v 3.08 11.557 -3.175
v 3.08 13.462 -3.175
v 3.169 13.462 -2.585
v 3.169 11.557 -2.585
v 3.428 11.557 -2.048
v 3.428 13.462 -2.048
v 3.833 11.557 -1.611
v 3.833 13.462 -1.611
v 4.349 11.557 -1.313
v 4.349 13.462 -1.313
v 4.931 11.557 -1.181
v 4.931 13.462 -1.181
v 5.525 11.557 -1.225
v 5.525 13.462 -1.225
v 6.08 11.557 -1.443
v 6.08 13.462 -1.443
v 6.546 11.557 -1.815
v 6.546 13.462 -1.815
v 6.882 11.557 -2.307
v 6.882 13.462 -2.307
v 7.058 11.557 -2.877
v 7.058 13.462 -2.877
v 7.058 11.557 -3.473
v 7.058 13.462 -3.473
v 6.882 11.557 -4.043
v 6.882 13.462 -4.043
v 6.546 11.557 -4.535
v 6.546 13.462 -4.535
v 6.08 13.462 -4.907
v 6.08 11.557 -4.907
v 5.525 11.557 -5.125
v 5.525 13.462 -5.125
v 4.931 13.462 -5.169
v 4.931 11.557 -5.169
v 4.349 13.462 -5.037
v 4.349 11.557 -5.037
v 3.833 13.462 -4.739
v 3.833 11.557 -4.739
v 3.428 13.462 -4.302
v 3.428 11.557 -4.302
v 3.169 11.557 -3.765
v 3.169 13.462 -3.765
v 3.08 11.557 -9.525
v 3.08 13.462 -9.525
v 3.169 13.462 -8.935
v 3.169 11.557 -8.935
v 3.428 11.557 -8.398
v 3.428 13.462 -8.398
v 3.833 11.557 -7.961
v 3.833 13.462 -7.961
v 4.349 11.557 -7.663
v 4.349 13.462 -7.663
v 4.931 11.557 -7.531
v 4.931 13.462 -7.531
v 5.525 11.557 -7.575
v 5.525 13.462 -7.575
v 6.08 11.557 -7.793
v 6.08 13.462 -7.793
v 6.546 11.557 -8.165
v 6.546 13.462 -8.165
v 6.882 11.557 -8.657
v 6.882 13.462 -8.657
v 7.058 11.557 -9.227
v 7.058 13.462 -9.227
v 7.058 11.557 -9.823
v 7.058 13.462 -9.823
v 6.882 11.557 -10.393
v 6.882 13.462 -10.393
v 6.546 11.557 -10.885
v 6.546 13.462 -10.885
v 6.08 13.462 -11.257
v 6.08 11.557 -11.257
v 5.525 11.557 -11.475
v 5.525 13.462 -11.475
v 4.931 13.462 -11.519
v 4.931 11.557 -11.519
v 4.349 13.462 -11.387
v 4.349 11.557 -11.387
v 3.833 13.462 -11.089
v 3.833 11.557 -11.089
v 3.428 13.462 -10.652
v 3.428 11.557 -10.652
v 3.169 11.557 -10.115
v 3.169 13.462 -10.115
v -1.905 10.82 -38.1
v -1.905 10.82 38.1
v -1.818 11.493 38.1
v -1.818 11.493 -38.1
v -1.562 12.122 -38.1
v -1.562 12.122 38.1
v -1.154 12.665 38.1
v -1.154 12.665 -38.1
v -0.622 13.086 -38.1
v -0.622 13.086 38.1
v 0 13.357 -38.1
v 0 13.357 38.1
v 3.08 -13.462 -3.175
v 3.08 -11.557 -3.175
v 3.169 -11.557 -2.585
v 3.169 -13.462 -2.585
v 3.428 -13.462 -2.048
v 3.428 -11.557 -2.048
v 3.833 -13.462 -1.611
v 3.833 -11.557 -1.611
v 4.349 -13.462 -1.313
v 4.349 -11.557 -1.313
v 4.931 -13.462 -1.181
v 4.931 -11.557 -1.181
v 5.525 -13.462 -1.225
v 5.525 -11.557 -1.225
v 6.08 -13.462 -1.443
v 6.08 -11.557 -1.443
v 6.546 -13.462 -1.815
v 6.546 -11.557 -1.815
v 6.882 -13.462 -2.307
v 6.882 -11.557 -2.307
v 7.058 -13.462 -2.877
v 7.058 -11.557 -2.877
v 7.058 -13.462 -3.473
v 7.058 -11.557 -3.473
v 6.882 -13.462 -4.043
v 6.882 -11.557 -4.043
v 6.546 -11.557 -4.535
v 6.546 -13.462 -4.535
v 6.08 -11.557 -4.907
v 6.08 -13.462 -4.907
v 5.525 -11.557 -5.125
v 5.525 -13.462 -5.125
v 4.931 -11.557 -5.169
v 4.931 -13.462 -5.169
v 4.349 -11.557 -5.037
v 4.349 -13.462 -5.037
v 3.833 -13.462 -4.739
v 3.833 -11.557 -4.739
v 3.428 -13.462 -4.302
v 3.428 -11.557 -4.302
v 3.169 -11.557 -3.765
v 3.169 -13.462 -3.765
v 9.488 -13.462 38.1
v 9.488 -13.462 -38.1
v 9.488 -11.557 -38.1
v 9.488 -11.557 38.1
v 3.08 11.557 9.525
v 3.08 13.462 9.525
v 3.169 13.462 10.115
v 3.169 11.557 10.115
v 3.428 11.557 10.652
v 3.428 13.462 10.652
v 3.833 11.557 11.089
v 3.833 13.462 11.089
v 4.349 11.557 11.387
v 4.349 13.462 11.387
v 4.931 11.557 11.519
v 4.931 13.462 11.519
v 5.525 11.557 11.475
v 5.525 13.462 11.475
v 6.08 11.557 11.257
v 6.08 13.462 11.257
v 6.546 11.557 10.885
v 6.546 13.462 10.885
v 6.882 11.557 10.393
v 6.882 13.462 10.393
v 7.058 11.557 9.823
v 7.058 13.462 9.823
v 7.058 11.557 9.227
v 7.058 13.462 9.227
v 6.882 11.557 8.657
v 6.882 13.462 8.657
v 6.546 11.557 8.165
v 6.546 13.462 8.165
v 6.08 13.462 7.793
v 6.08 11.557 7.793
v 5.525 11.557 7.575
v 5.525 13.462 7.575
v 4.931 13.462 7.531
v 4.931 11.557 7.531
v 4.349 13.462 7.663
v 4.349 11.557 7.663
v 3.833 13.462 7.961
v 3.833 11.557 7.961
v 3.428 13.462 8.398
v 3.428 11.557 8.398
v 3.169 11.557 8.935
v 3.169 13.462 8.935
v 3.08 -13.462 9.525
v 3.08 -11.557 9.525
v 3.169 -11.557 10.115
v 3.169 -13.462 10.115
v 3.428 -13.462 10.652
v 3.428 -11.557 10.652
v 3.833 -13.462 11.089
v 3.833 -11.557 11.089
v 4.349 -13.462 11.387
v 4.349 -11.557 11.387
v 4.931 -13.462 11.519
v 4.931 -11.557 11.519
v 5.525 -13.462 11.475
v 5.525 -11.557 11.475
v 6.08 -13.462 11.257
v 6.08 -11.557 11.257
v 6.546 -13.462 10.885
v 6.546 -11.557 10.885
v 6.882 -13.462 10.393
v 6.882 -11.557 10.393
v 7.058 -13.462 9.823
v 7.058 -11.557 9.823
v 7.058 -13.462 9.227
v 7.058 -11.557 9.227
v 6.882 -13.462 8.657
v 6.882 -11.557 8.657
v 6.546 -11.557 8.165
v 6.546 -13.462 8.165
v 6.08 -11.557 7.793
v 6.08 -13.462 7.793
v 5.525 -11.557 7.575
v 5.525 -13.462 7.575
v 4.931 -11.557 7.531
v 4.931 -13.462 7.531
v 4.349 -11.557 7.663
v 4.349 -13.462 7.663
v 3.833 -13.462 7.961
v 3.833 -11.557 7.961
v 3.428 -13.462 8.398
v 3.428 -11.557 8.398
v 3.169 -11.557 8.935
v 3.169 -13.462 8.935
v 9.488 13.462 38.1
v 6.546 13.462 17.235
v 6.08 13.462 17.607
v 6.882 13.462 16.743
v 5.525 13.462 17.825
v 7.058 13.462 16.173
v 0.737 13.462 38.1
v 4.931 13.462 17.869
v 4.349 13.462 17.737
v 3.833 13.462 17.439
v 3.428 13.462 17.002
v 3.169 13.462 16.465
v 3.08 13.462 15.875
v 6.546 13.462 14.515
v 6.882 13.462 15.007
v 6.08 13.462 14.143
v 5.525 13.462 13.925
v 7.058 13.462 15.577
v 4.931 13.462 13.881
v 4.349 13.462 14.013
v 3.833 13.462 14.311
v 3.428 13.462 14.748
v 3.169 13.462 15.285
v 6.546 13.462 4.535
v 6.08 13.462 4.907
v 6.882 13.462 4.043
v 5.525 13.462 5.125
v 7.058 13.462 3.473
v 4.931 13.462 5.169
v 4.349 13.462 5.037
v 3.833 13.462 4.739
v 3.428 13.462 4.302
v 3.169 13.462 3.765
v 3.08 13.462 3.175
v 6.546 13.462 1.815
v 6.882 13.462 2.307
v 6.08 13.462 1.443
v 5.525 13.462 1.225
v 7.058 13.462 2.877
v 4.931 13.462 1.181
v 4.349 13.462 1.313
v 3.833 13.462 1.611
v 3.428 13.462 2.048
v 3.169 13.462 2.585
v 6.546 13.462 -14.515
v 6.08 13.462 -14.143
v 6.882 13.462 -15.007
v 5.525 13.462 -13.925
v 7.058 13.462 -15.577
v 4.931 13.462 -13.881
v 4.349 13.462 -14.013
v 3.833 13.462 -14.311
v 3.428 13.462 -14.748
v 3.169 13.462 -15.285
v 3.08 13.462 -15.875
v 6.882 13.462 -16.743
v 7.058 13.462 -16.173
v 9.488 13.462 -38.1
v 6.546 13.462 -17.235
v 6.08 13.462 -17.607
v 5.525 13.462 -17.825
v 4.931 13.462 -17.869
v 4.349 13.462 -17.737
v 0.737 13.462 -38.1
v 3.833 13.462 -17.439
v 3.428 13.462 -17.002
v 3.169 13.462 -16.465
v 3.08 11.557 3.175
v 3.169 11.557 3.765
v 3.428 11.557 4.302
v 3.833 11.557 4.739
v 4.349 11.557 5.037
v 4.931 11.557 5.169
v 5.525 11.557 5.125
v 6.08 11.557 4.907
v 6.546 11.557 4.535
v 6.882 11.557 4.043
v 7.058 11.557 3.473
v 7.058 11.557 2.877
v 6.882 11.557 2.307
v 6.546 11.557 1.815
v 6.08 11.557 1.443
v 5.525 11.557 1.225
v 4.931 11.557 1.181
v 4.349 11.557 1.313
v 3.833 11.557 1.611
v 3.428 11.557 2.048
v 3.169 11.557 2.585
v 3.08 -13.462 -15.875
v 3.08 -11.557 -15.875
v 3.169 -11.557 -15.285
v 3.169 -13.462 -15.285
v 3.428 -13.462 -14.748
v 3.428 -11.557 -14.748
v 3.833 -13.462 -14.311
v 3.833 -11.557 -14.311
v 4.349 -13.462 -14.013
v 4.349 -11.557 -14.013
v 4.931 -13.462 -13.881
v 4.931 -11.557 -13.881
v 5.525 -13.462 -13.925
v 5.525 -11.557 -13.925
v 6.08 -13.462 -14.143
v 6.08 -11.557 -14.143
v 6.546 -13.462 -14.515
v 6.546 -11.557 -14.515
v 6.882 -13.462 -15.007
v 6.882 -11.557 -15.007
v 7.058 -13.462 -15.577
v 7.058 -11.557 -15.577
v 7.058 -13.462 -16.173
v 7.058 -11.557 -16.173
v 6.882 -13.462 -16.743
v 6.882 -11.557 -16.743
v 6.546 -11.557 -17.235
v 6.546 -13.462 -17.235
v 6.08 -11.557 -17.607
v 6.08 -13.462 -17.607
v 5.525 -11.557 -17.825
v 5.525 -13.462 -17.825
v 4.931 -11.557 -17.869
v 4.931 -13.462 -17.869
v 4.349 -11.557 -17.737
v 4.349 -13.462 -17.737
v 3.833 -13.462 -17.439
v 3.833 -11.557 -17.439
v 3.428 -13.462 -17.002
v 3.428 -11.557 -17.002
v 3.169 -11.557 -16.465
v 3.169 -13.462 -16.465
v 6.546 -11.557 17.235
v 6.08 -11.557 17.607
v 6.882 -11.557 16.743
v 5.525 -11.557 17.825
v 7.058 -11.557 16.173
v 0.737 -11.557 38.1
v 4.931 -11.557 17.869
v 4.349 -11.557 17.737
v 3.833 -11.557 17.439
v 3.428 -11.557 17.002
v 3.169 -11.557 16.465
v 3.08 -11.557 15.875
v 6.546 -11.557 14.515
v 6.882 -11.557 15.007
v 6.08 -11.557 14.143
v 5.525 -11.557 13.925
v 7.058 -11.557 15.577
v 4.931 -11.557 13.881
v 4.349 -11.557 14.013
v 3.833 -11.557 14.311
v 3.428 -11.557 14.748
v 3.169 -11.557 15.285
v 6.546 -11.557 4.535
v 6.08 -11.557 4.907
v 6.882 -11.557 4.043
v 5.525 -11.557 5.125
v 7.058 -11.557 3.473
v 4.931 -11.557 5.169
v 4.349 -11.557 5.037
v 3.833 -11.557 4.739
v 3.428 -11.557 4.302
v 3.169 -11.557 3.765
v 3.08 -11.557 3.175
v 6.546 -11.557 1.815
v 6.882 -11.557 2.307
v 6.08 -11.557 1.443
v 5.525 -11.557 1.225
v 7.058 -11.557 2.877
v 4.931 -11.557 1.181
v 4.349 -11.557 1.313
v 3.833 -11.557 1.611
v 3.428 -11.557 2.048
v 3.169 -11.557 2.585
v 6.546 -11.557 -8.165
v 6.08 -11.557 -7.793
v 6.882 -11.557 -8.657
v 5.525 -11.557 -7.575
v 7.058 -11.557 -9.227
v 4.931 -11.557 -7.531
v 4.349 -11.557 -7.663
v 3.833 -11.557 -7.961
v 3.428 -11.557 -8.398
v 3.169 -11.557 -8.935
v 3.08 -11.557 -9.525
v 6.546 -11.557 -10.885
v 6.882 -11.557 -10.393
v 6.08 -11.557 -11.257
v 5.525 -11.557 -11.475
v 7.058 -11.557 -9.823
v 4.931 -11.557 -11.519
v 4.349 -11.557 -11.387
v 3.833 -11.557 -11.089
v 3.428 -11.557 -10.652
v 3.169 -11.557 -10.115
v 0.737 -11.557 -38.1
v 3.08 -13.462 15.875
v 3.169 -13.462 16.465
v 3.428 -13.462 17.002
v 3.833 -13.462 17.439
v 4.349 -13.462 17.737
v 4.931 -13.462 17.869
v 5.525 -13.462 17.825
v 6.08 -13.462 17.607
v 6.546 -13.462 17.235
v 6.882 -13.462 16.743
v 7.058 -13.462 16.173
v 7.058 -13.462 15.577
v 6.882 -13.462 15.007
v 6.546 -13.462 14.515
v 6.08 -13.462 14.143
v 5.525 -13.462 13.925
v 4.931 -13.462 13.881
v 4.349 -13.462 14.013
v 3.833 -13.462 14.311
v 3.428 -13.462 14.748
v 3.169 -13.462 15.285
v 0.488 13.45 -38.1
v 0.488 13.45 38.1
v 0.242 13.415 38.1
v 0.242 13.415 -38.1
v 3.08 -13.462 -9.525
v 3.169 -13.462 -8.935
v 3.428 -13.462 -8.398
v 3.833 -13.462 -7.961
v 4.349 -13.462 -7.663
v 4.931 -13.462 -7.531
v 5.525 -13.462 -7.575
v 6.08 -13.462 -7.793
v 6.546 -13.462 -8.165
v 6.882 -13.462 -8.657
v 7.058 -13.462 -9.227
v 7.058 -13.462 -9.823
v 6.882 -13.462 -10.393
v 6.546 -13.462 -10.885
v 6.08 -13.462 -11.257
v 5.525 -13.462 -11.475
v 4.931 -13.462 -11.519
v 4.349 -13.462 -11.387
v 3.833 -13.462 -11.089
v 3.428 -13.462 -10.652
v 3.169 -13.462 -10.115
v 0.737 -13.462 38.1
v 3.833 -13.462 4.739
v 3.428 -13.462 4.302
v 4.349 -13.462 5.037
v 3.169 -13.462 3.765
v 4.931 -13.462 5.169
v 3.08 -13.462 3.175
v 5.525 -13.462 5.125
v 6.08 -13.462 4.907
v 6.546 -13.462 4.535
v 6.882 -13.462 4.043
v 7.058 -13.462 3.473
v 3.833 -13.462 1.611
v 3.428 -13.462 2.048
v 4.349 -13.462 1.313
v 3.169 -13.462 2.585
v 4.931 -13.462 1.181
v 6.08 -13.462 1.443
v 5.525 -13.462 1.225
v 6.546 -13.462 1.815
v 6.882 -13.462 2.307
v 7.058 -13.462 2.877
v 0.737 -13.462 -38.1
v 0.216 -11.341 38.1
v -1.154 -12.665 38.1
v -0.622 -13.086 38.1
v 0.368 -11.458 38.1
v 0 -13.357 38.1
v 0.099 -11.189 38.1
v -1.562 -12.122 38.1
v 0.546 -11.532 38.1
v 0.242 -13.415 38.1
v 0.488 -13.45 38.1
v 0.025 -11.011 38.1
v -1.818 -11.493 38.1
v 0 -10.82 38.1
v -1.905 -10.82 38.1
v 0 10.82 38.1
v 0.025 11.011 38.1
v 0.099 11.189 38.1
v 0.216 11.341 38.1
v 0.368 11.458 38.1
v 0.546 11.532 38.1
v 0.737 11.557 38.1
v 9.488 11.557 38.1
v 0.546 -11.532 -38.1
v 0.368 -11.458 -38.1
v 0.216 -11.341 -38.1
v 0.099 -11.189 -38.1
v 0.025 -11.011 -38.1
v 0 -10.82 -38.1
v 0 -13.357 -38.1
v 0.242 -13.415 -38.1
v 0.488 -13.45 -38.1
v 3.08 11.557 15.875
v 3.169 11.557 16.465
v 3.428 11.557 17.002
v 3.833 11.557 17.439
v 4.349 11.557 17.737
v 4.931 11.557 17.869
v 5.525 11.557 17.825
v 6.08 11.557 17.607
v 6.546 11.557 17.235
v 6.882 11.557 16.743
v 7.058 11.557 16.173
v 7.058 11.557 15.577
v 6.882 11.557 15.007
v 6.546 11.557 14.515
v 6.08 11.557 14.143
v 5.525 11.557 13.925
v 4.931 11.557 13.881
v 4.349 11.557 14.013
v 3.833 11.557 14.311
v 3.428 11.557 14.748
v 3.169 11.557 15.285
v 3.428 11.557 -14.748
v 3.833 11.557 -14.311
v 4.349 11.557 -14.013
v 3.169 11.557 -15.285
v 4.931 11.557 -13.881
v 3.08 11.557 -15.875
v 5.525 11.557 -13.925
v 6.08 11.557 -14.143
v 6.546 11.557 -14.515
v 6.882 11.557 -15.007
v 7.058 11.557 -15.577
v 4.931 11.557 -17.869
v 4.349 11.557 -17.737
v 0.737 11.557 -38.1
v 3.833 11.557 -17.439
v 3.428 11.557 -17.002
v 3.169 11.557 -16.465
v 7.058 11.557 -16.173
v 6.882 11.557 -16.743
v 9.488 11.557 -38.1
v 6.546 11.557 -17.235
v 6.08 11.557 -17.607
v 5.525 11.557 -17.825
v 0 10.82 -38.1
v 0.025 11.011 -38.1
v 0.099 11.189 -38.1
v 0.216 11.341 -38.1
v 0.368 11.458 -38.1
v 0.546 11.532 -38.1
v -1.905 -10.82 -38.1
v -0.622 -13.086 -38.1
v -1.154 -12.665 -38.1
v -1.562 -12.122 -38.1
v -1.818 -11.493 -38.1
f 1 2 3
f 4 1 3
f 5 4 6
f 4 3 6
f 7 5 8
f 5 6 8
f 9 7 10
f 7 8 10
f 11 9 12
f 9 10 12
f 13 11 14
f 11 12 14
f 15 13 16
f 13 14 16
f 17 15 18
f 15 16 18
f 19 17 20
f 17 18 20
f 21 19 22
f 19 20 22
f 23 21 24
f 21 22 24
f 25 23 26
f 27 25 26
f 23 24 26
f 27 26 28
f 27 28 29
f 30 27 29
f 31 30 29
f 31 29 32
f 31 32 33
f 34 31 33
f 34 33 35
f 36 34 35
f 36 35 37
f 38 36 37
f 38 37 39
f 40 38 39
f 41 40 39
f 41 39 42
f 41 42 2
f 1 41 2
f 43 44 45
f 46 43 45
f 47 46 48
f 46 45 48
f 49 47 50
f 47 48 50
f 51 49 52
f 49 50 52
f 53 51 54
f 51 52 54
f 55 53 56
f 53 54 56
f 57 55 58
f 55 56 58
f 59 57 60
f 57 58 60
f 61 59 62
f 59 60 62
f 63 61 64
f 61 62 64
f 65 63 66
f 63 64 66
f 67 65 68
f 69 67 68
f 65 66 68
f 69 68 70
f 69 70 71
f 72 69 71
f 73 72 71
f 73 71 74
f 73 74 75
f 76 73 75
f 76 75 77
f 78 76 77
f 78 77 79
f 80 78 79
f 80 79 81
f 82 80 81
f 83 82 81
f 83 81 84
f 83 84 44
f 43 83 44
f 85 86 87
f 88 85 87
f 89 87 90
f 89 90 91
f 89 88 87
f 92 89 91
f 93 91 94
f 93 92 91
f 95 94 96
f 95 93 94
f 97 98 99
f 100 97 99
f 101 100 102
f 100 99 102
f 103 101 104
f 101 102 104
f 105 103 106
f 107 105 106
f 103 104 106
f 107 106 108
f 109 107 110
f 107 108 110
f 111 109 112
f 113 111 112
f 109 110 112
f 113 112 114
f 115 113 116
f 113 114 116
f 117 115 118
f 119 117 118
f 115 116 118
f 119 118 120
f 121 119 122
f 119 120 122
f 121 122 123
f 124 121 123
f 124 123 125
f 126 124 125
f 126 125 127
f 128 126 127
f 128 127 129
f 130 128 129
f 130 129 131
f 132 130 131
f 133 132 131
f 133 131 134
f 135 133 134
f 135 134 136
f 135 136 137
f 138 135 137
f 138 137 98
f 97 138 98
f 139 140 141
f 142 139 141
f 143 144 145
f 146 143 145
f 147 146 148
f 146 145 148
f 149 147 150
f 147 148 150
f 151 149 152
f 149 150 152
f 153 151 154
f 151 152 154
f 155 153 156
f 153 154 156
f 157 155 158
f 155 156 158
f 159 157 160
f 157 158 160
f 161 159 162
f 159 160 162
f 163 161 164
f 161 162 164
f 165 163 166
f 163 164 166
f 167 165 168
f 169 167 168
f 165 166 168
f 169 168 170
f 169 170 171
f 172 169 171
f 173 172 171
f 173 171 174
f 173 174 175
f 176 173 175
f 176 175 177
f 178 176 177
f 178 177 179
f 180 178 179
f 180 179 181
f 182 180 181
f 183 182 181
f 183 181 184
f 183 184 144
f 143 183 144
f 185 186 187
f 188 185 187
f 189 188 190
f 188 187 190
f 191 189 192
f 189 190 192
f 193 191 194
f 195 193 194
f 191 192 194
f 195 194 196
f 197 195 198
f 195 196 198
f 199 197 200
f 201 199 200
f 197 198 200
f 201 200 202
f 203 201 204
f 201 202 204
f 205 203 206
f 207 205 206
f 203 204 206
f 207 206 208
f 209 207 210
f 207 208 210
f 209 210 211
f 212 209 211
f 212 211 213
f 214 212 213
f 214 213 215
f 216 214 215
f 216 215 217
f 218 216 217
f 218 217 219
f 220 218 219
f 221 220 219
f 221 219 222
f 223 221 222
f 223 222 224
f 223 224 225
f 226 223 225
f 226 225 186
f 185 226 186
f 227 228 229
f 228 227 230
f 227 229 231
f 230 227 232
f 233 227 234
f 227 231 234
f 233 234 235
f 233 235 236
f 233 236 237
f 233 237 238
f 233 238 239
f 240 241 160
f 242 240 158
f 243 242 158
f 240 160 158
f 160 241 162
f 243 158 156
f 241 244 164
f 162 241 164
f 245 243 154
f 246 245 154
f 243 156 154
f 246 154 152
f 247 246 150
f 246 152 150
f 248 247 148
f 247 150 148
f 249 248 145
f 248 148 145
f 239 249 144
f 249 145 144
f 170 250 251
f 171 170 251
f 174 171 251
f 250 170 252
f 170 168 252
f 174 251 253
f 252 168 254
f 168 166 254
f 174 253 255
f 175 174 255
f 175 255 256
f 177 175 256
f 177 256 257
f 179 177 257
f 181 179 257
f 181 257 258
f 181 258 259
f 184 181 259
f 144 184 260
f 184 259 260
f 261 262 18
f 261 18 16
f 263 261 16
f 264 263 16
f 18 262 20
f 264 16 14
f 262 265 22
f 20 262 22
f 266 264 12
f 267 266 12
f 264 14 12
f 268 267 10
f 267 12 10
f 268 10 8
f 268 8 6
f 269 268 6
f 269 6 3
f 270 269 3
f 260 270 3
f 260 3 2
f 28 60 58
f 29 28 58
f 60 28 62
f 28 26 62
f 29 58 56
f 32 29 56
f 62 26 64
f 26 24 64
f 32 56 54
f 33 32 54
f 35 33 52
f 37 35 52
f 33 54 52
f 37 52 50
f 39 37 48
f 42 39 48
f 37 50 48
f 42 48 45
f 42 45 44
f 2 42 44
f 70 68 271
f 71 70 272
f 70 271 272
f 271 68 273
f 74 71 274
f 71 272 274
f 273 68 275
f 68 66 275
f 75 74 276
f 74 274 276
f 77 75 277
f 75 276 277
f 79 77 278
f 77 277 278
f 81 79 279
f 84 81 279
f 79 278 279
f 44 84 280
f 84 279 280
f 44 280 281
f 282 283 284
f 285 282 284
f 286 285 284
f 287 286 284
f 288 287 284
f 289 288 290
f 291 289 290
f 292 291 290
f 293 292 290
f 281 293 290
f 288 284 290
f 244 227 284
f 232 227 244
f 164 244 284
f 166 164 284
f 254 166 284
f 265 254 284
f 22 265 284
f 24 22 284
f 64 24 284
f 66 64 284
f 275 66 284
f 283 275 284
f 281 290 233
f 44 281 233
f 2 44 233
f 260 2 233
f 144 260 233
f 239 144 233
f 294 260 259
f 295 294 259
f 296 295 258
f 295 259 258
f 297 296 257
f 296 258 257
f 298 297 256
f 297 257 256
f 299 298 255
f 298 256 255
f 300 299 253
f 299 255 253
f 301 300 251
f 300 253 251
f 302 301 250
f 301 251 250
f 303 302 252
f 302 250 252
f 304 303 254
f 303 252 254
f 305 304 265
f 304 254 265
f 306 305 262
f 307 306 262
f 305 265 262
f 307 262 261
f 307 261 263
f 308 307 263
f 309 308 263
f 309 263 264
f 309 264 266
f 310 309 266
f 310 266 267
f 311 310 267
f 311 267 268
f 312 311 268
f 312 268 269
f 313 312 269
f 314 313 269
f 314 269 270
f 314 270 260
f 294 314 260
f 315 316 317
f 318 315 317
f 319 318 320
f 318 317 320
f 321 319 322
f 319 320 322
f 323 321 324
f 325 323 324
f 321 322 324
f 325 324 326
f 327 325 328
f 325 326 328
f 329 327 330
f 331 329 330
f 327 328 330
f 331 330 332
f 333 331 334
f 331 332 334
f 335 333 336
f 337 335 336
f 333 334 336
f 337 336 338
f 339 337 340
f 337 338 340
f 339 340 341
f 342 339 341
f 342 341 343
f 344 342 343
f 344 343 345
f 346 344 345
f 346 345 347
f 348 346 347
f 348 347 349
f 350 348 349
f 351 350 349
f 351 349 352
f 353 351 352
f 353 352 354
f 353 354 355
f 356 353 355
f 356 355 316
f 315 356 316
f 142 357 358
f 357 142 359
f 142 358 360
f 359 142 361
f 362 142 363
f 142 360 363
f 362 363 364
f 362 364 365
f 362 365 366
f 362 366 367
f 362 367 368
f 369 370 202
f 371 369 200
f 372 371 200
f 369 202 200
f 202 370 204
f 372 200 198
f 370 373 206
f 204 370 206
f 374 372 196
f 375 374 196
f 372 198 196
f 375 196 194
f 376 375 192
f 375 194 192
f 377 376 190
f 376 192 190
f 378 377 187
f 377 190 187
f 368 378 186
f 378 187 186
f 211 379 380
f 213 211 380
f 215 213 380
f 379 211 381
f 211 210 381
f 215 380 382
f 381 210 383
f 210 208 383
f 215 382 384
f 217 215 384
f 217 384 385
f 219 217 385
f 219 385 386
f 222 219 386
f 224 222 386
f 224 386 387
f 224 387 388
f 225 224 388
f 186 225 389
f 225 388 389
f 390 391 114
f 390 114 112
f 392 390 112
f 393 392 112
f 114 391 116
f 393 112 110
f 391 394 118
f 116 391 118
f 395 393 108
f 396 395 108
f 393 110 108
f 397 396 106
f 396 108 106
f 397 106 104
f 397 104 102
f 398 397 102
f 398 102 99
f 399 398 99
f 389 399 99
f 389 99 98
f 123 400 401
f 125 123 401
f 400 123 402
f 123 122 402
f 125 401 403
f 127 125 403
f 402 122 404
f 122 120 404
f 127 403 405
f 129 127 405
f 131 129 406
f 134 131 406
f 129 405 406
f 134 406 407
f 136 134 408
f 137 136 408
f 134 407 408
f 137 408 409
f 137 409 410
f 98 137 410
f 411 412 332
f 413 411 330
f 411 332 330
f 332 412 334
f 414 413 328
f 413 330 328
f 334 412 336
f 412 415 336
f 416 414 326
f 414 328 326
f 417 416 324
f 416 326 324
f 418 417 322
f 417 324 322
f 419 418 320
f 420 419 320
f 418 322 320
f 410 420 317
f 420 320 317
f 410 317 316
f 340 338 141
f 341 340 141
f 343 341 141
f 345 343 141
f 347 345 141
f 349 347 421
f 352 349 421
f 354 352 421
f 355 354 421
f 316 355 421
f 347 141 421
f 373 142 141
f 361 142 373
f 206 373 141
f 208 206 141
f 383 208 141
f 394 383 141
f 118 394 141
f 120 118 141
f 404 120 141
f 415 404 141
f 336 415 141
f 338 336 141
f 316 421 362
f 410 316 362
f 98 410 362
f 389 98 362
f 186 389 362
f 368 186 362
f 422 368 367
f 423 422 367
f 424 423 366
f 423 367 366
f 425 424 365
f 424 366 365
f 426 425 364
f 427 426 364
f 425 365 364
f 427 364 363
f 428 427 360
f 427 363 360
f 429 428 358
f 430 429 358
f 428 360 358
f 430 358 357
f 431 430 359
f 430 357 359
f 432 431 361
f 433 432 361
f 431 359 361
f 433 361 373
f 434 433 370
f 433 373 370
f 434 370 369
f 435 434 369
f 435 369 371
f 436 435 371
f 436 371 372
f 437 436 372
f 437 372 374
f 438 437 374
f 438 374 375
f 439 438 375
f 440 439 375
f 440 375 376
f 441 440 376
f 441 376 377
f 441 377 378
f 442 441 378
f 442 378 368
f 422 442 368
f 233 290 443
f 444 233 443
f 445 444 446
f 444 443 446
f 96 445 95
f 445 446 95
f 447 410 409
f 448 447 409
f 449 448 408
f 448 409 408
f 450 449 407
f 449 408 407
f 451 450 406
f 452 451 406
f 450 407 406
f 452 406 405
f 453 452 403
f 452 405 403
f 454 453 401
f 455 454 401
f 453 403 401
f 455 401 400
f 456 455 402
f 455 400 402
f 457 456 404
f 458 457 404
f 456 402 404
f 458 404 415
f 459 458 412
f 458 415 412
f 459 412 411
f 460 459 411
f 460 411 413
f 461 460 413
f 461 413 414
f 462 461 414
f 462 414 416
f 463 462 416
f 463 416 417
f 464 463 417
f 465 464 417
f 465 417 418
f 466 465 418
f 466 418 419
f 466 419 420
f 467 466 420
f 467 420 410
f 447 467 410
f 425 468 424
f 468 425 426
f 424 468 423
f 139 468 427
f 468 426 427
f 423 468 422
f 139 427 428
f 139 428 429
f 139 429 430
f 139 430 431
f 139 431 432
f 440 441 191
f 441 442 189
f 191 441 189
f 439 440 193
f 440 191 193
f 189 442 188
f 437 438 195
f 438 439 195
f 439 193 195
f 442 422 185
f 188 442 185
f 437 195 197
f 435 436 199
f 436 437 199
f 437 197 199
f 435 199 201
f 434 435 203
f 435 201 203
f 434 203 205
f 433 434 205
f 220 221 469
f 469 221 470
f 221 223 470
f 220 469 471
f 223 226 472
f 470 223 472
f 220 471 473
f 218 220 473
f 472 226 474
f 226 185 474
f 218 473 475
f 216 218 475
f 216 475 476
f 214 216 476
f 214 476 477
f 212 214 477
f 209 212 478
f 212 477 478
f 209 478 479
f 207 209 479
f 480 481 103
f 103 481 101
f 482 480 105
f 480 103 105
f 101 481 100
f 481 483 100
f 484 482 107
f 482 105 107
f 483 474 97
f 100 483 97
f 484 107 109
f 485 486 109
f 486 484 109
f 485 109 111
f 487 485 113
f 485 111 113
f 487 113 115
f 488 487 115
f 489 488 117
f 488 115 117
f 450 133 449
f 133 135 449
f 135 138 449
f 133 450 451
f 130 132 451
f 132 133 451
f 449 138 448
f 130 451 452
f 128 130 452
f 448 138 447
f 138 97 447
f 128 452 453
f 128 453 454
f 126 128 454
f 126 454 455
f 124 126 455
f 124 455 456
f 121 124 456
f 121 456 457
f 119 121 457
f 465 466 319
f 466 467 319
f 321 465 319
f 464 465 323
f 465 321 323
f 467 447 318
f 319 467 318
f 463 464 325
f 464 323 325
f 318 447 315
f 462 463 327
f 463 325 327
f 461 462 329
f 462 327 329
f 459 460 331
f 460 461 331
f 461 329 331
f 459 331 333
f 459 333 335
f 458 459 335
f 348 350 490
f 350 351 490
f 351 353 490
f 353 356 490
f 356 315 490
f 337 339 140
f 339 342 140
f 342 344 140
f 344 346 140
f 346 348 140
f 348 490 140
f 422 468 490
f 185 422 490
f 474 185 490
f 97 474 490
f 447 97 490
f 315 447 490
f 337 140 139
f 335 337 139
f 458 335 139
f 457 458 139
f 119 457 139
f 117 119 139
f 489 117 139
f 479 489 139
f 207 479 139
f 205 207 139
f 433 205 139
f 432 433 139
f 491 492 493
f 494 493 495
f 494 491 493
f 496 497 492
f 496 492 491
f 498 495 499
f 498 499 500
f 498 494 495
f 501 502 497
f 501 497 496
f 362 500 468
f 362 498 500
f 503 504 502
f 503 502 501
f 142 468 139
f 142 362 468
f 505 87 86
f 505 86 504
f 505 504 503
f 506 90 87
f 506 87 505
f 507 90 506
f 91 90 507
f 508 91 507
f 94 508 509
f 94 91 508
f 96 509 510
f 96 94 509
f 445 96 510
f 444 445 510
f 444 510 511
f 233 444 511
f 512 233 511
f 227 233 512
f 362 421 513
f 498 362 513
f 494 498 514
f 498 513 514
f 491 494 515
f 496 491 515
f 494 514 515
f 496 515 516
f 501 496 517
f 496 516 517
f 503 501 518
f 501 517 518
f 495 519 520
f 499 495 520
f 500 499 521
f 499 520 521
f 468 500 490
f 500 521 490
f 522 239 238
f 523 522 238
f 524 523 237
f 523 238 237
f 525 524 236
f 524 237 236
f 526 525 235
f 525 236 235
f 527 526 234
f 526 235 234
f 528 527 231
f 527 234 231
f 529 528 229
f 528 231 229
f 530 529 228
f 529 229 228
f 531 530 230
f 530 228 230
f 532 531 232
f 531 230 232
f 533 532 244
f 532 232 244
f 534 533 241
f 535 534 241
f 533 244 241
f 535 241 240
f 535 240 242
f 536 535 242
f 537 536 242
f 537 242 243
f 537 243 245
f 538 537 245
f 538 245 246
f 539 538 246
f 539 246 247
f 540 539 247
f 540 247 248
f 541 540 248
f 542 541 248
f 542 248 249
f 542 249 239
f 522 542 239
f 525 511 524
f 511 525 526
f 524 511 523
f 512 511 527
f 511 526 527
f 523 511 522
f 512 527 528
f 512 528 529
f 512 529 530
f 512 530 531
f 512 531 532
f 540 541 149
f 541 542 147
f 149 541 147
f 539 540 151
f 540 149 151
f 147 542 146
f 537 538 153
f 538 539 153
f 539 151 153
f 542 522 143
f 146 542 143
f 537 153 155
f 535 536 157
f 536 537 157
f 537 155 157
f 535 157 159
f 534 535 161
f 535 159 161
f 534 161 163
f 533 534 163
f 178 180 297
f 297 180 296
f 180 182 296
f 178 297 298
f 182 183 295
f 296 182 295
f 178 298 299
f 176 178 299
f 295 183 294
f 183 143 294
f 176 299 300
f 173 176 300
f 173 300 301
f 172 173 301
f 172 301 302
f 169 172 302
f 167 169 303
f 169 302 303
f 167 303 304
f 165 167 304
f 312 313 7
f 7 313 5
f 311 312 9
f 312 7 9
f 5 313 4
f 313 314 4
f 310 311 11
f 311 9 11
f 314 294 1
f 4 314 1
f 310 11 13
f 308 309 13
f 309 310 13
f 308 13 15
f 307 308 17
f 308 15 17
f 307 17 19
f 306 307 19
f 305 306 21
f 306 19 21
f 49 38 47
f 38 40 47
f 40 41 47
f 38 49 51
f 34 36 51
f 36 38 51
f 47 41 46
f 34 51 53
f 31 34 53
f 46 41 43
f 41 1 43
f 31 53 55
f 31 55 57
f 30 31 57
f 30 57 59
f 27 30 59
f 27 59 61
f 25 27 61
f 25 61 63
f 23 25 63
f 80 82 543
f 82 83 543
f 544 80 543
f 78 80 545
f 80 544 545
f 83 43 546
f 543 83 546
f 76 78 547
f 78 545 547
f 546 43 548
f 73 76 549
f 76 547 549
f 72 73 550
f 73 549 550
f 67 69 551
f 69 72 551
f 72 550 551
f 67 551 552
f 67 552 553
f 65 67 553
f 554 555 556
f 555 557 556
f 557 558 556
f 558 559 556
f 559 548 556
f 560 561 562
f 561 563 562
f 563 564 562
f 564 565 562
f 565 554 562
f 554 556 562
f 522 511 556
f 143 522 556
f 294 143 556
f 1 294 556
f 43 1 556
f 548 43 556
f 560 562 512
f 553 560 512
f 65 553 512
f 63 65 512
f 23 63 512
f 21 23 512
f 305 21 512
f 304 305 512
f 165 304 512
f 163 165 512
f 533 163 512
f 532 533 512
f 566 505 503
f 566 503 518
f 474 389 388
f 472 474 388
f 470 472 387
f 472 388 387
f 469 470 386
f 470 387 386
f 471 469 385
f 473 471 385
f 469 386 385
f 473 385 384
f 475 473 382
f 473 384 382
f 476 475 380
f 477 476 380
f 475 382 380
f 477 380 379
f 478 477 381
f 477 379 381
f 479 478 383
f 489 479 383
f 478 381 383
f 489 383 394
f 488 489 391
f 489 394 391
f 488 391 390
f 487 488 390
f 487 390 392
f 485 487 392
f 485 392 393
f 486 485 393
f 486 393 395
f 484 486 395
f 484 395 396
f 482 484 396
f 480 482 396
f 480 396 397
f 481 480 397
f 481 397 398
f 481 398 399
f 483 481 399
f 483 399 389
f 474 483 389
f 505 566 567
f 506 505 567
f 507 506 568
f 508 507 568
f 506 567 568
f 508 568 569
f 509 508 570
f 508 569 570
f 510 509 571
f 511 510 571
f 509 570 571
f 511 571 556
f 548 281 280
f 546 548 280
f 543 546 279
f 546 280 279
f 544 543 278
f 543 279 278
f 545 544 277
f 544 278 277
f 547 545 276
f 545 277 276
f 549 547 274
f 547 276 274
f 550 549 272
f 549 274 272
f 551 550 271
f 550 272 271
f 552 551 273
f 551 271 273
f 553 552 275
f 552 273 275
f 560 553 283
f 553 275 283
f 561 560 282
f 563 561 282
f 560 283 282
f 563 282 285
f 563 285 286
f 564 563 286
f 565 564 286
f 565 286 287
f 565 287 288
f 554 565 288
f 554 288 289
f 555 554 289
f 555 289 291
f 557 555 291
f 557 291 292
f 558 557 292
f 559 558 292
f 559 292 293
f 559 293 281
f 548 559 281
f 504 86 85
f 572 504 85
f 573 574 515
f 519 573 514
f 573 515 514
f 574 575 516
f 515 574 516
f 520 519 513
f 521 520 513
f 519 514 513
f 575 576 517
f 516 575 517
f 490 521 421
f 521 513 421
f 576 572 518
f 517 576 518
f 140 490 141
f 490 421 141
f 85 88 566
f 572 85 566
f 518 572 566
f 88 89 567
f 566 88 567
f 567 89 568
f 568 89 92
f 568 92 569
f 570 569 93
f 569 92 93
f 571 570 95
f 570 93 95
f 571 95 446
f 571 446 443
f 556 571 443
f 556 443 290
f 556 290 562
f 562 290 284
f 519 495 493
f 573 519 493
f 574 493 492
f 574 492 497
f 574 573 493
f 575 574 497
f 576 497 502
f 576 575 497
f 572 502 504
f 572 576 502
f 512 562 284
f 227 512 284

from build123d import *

# Parameters (mm, degrees)
SKETCH4_W              = 76.2
SKETCH4_H              = 44.45
BASE_FLANGE1_DEPTH     = 1.905
SKETCHED_START         = -38.1
SKETCHED_BEND3_DEPTH   = 76.2
SKETCHED_BEND3_2_DEPTH = 76.2
CUT_EXTRUDE2_REACH     = 49.608
SKETCH20_R             = 2


# Read off the part's stored shape, not the designer's step: Sketched Bend3
# Sheet-metal steps are written as plain solids
with BuildPart() as part:
    # Sketch4 → Base-Flange1 (new body)
    with BuildSketch(Plane(origin=(0, 0, 0), x_dir=(0, 0, -1), z_dir=(1, 0, 0))):
        Rectangle(SKETCH4_W, SKETCH4_H)
    extrude(amount=-BASE_FLANGE1_DEPTH)

    # Sketched Bend3 outline → Sketched Bend3 (cut)
    with BuildSketch(Plane.XY.offset(SKETCHED_START)):
        with BuildLine():
            ThreePointArc((0, -13.357223013), (-1.375727285, -12.406629491), (-1.905, -10.8204))
            Line((-1.905, -10.8204), (-1.905, -22.225))
            Line((-1.905, -22.225), (0, -22.225))
            Line((0, -22.225), (0, -13.357223013))
        make_face()
        with BuildLine():
            Line((-1.905, 22.225), (-1.905, 10.8204))
            ThreePointArc((-1.905, 10.8204), (-1.375727285, 12.406629491), (0, 13.357223013))
            Line((0, 13.357223013), (0, 22.225))
            Line((0, 22.225), (-1.905, 22.225))
        make_face()
    extrude(amount=SKETCHED_BEND3_DEPTH, mode=Mode.SUBTRACT)

    # Sketched Bend3 2 outline → Sketched Bend3 2 (add)
    with BuildSketch(Plane.XY.offset(SKETCHED_START)):
        with BuildLine():
            Line((0, -10.8204), (0, -13.357223013))
            ThreePointArc((0, -13.357223013), (0.364592683, -13.435674577), (0.7366, -13.462))
            Line((0.7366, -13.462), (9.487967924, -13.462))
            Line((9.487967924, -13.462), (9.487967924, -11.557))
            Line((9.487967924, -11.557), (0.7366, -11.557))
            ThreePointArc((0.7366, -11.557), (0.215745145, -11.341254855), (0, -10.8204))
        make_face()
        with BuildLine():
            ThreePointArc((0.7366, 13.462), (0.364592683, 13.435674577), (0, 13.357223013))
            Line((0, 13.357223013), (0, 10.8204))
            ThreePointArc((0, 10.8204), (0.215745145, 11.341254855), (0.7366, 11.557))
            Line((0.7366, 11.557), (9.487967924, 11.557))
            Line((9.487967924, 11.557), (9.487967924, 13.462))
            Line((9.487967924, 13.462), (0.7366, 13.462))
        make_face()
    extrude(amount=SKETCHED_BEND3_2_DEPTH)

    # Cut-Extrude2: up to this face of the body (flat: up to its plane)
    cut_extrude2_end = Plane(part.part.faces().sort_by_distance((5.112283962, -13.462, 0))[0])
    # Sketch20 → Cut-Extrude2 (cut, up to the picked face)
    with BuildSketch(Plane(origin=(0, 13.462, 0), x_dir=(1, 0, 0), z_dir=(0, 1, 0)), mode=Mode.PRIVATE) as cut_extrude2_sk1:
        with Locations(Location((5.08, -3.175, 0), (0, 0, 180))):
            Circle(SKETCH20_R)
    cut_extrude2_tool1 = split(extrude(cut_extrude2_sk1.sketch, amount=-CUT_EXTRUDE2_REACH, mode=Mode.PRIVATE), bisect_by=cut_extrude2_end, keep=Keep.BOTH, mode=Mode.PRIVATE)
    # Sketch20 → Cut-Extrude2 (cut, up to the picked face)
    with BuildSketch(Plane(origin=(0, 13.462, 0), x_dir=(1, 0, 0), z_dir=(0, 1, 0)), mode=Mode.PRIVATE) as cut_extrude2_sk2:
        with Locations(Location((5.08, 3.175, 0), (0, 0, 180))):
            Circle(SKETCH20_R)
    cut_extrude2_tool2 = split(extrude(cut_extrude2_sk2.sketch, amount=-CUT_EXTRUDE2_REACH, mode=Mode.PRIVATE), bisect_by=cut_extrude2_end, keep=Keep.BOTH, mode=Mode.PRIVATE)
    # Sketch20 → Cut-Extrude2 (cut, up to the picked face)
    with BuildSketch(Plane(origin=(0, 13.462, 0), x_dir=(1, 0, 0), z_dir=(0, 1, 0)), mode=Mode.PRIVATE) as cut_extrude2_sk3:
        with Locations(Location((5.08, 9.525, 0), (0, 0, 180))):
            Circle(SKETCH20_R)
    cut_extrude2_tool3 = split(extrude(cut_extrude2_sk3.sketch, amount=-CUT_EXTRUDE2_REACH, mode=Mode.PRIVATE), bisect_by=cut_extrude2_end, keep=Keep.BOTH, mode=Mode.PRIVATE)
    # Sketch20 → Cut-Extrude2 (cut, up to the picked face)
    with BuildSketch(Plane(origin=(0, 13.462, 0), x_dir=(1, 0, 0), z_dir=(0, 1, 0)), mode=Mode.PRIVATE) as cut_extrude2_sk4:
        with Locations(Location((5.08, 15.875, 0), (0, 0, 180))):
            Circle(SKETCH20_R)
    cut_extrude2_tool4 = split(extrude(cut_extrude2_sk4.sketch, amount=-CUT_EXTRUDE2_REACH, mode=Mode.PRIVATE), bisect_by=cut_extrude2_end, keep=Keep.BOTH, mode=Mode.PRIVATE)
    # Sketch20 → Cut-Extrude2 (cut, up to the picked face)
    with BuildSketch(Plane(origin=(0, 13.462, 0), x_dir=(1, 0, 0), z_dir=(0, 1, 0)), mode=Mode.PRIVATE) as cut_extrude2_sk5:
        with Locations(Location((5.08, -9.525, 0), (0, 0, 180))):
            Circle(SKETCH20_R)
    cut_extrude2_tool5 = split(extrude(cut_extrude2_sk5.sketch, amount=-CUT_EXTRUDE2_REACH, mode=Mode.PRIVATE), bisect_by=cut_extrude2_end, keep=Keep.BOTH, mode=Mode.PRIVATE)
    # Sketch20 → Cut-Extrude2 (cut, up to the picked face)
    with BuildSketch(Plane(origin=(0, 13.462, 0), x_dir=(1, 0, 0), z_dir=(0, 1, 0)), mode=Mode.PRIVATE) as cut_extrude2_sk6:
        with Locations(Location((5.08, -15.875, 0), (0, 0, 180))):
            Circle(SKETCH20_R)
    cut_extrude2_tool6 = split(extrude(cut_extrude2_sk6.sketch, amount=-CUT_EXTRUDE2_REACH, mode=Mode.PRIVATE), bisect_by=cut_extrude2_end, keep=Keep.BOTH, mode=Mode.PRIVATE)
    add(cut_extrude2_tool1.solids().sort_by(Axis((5.08, 13.462, 3.175), (0, -1, 0)))[0], mode=Mode.SUBTRACT)
    add(cut_extrude2_tool2.solids().sort_by(Axis((5.08, 13.462, -3.175), (0, -1, 0)))[0], mode=Mode.SUBTRACT)
    add(cut_extrude2_tool3.solids().sort_by(Axis((5.08, 13.462, -9.525), (0, -1, 0)))[0], mode=Mode.SUBTRACT)
    add(cut_extrude2_tool4.solids().sort_by(Axis((5.08, 13.462, -15.875), (0, -1, 0)))[0], mode=Mode.SUBTRACT)
    add(cut_extrude2_tool5.solids().sort_by(Axis((5.08, 13.462, 9.525), (0, -1, 0)))[0], mode=Mode.SUBTRACT)
    add(cut_extrude2_tool6.solids().sort_by(Axis((5.08, 13.462, 15.875), (0, -1, 0)))[0], mode=Mode.SUBTRACT)


solid = part.part
